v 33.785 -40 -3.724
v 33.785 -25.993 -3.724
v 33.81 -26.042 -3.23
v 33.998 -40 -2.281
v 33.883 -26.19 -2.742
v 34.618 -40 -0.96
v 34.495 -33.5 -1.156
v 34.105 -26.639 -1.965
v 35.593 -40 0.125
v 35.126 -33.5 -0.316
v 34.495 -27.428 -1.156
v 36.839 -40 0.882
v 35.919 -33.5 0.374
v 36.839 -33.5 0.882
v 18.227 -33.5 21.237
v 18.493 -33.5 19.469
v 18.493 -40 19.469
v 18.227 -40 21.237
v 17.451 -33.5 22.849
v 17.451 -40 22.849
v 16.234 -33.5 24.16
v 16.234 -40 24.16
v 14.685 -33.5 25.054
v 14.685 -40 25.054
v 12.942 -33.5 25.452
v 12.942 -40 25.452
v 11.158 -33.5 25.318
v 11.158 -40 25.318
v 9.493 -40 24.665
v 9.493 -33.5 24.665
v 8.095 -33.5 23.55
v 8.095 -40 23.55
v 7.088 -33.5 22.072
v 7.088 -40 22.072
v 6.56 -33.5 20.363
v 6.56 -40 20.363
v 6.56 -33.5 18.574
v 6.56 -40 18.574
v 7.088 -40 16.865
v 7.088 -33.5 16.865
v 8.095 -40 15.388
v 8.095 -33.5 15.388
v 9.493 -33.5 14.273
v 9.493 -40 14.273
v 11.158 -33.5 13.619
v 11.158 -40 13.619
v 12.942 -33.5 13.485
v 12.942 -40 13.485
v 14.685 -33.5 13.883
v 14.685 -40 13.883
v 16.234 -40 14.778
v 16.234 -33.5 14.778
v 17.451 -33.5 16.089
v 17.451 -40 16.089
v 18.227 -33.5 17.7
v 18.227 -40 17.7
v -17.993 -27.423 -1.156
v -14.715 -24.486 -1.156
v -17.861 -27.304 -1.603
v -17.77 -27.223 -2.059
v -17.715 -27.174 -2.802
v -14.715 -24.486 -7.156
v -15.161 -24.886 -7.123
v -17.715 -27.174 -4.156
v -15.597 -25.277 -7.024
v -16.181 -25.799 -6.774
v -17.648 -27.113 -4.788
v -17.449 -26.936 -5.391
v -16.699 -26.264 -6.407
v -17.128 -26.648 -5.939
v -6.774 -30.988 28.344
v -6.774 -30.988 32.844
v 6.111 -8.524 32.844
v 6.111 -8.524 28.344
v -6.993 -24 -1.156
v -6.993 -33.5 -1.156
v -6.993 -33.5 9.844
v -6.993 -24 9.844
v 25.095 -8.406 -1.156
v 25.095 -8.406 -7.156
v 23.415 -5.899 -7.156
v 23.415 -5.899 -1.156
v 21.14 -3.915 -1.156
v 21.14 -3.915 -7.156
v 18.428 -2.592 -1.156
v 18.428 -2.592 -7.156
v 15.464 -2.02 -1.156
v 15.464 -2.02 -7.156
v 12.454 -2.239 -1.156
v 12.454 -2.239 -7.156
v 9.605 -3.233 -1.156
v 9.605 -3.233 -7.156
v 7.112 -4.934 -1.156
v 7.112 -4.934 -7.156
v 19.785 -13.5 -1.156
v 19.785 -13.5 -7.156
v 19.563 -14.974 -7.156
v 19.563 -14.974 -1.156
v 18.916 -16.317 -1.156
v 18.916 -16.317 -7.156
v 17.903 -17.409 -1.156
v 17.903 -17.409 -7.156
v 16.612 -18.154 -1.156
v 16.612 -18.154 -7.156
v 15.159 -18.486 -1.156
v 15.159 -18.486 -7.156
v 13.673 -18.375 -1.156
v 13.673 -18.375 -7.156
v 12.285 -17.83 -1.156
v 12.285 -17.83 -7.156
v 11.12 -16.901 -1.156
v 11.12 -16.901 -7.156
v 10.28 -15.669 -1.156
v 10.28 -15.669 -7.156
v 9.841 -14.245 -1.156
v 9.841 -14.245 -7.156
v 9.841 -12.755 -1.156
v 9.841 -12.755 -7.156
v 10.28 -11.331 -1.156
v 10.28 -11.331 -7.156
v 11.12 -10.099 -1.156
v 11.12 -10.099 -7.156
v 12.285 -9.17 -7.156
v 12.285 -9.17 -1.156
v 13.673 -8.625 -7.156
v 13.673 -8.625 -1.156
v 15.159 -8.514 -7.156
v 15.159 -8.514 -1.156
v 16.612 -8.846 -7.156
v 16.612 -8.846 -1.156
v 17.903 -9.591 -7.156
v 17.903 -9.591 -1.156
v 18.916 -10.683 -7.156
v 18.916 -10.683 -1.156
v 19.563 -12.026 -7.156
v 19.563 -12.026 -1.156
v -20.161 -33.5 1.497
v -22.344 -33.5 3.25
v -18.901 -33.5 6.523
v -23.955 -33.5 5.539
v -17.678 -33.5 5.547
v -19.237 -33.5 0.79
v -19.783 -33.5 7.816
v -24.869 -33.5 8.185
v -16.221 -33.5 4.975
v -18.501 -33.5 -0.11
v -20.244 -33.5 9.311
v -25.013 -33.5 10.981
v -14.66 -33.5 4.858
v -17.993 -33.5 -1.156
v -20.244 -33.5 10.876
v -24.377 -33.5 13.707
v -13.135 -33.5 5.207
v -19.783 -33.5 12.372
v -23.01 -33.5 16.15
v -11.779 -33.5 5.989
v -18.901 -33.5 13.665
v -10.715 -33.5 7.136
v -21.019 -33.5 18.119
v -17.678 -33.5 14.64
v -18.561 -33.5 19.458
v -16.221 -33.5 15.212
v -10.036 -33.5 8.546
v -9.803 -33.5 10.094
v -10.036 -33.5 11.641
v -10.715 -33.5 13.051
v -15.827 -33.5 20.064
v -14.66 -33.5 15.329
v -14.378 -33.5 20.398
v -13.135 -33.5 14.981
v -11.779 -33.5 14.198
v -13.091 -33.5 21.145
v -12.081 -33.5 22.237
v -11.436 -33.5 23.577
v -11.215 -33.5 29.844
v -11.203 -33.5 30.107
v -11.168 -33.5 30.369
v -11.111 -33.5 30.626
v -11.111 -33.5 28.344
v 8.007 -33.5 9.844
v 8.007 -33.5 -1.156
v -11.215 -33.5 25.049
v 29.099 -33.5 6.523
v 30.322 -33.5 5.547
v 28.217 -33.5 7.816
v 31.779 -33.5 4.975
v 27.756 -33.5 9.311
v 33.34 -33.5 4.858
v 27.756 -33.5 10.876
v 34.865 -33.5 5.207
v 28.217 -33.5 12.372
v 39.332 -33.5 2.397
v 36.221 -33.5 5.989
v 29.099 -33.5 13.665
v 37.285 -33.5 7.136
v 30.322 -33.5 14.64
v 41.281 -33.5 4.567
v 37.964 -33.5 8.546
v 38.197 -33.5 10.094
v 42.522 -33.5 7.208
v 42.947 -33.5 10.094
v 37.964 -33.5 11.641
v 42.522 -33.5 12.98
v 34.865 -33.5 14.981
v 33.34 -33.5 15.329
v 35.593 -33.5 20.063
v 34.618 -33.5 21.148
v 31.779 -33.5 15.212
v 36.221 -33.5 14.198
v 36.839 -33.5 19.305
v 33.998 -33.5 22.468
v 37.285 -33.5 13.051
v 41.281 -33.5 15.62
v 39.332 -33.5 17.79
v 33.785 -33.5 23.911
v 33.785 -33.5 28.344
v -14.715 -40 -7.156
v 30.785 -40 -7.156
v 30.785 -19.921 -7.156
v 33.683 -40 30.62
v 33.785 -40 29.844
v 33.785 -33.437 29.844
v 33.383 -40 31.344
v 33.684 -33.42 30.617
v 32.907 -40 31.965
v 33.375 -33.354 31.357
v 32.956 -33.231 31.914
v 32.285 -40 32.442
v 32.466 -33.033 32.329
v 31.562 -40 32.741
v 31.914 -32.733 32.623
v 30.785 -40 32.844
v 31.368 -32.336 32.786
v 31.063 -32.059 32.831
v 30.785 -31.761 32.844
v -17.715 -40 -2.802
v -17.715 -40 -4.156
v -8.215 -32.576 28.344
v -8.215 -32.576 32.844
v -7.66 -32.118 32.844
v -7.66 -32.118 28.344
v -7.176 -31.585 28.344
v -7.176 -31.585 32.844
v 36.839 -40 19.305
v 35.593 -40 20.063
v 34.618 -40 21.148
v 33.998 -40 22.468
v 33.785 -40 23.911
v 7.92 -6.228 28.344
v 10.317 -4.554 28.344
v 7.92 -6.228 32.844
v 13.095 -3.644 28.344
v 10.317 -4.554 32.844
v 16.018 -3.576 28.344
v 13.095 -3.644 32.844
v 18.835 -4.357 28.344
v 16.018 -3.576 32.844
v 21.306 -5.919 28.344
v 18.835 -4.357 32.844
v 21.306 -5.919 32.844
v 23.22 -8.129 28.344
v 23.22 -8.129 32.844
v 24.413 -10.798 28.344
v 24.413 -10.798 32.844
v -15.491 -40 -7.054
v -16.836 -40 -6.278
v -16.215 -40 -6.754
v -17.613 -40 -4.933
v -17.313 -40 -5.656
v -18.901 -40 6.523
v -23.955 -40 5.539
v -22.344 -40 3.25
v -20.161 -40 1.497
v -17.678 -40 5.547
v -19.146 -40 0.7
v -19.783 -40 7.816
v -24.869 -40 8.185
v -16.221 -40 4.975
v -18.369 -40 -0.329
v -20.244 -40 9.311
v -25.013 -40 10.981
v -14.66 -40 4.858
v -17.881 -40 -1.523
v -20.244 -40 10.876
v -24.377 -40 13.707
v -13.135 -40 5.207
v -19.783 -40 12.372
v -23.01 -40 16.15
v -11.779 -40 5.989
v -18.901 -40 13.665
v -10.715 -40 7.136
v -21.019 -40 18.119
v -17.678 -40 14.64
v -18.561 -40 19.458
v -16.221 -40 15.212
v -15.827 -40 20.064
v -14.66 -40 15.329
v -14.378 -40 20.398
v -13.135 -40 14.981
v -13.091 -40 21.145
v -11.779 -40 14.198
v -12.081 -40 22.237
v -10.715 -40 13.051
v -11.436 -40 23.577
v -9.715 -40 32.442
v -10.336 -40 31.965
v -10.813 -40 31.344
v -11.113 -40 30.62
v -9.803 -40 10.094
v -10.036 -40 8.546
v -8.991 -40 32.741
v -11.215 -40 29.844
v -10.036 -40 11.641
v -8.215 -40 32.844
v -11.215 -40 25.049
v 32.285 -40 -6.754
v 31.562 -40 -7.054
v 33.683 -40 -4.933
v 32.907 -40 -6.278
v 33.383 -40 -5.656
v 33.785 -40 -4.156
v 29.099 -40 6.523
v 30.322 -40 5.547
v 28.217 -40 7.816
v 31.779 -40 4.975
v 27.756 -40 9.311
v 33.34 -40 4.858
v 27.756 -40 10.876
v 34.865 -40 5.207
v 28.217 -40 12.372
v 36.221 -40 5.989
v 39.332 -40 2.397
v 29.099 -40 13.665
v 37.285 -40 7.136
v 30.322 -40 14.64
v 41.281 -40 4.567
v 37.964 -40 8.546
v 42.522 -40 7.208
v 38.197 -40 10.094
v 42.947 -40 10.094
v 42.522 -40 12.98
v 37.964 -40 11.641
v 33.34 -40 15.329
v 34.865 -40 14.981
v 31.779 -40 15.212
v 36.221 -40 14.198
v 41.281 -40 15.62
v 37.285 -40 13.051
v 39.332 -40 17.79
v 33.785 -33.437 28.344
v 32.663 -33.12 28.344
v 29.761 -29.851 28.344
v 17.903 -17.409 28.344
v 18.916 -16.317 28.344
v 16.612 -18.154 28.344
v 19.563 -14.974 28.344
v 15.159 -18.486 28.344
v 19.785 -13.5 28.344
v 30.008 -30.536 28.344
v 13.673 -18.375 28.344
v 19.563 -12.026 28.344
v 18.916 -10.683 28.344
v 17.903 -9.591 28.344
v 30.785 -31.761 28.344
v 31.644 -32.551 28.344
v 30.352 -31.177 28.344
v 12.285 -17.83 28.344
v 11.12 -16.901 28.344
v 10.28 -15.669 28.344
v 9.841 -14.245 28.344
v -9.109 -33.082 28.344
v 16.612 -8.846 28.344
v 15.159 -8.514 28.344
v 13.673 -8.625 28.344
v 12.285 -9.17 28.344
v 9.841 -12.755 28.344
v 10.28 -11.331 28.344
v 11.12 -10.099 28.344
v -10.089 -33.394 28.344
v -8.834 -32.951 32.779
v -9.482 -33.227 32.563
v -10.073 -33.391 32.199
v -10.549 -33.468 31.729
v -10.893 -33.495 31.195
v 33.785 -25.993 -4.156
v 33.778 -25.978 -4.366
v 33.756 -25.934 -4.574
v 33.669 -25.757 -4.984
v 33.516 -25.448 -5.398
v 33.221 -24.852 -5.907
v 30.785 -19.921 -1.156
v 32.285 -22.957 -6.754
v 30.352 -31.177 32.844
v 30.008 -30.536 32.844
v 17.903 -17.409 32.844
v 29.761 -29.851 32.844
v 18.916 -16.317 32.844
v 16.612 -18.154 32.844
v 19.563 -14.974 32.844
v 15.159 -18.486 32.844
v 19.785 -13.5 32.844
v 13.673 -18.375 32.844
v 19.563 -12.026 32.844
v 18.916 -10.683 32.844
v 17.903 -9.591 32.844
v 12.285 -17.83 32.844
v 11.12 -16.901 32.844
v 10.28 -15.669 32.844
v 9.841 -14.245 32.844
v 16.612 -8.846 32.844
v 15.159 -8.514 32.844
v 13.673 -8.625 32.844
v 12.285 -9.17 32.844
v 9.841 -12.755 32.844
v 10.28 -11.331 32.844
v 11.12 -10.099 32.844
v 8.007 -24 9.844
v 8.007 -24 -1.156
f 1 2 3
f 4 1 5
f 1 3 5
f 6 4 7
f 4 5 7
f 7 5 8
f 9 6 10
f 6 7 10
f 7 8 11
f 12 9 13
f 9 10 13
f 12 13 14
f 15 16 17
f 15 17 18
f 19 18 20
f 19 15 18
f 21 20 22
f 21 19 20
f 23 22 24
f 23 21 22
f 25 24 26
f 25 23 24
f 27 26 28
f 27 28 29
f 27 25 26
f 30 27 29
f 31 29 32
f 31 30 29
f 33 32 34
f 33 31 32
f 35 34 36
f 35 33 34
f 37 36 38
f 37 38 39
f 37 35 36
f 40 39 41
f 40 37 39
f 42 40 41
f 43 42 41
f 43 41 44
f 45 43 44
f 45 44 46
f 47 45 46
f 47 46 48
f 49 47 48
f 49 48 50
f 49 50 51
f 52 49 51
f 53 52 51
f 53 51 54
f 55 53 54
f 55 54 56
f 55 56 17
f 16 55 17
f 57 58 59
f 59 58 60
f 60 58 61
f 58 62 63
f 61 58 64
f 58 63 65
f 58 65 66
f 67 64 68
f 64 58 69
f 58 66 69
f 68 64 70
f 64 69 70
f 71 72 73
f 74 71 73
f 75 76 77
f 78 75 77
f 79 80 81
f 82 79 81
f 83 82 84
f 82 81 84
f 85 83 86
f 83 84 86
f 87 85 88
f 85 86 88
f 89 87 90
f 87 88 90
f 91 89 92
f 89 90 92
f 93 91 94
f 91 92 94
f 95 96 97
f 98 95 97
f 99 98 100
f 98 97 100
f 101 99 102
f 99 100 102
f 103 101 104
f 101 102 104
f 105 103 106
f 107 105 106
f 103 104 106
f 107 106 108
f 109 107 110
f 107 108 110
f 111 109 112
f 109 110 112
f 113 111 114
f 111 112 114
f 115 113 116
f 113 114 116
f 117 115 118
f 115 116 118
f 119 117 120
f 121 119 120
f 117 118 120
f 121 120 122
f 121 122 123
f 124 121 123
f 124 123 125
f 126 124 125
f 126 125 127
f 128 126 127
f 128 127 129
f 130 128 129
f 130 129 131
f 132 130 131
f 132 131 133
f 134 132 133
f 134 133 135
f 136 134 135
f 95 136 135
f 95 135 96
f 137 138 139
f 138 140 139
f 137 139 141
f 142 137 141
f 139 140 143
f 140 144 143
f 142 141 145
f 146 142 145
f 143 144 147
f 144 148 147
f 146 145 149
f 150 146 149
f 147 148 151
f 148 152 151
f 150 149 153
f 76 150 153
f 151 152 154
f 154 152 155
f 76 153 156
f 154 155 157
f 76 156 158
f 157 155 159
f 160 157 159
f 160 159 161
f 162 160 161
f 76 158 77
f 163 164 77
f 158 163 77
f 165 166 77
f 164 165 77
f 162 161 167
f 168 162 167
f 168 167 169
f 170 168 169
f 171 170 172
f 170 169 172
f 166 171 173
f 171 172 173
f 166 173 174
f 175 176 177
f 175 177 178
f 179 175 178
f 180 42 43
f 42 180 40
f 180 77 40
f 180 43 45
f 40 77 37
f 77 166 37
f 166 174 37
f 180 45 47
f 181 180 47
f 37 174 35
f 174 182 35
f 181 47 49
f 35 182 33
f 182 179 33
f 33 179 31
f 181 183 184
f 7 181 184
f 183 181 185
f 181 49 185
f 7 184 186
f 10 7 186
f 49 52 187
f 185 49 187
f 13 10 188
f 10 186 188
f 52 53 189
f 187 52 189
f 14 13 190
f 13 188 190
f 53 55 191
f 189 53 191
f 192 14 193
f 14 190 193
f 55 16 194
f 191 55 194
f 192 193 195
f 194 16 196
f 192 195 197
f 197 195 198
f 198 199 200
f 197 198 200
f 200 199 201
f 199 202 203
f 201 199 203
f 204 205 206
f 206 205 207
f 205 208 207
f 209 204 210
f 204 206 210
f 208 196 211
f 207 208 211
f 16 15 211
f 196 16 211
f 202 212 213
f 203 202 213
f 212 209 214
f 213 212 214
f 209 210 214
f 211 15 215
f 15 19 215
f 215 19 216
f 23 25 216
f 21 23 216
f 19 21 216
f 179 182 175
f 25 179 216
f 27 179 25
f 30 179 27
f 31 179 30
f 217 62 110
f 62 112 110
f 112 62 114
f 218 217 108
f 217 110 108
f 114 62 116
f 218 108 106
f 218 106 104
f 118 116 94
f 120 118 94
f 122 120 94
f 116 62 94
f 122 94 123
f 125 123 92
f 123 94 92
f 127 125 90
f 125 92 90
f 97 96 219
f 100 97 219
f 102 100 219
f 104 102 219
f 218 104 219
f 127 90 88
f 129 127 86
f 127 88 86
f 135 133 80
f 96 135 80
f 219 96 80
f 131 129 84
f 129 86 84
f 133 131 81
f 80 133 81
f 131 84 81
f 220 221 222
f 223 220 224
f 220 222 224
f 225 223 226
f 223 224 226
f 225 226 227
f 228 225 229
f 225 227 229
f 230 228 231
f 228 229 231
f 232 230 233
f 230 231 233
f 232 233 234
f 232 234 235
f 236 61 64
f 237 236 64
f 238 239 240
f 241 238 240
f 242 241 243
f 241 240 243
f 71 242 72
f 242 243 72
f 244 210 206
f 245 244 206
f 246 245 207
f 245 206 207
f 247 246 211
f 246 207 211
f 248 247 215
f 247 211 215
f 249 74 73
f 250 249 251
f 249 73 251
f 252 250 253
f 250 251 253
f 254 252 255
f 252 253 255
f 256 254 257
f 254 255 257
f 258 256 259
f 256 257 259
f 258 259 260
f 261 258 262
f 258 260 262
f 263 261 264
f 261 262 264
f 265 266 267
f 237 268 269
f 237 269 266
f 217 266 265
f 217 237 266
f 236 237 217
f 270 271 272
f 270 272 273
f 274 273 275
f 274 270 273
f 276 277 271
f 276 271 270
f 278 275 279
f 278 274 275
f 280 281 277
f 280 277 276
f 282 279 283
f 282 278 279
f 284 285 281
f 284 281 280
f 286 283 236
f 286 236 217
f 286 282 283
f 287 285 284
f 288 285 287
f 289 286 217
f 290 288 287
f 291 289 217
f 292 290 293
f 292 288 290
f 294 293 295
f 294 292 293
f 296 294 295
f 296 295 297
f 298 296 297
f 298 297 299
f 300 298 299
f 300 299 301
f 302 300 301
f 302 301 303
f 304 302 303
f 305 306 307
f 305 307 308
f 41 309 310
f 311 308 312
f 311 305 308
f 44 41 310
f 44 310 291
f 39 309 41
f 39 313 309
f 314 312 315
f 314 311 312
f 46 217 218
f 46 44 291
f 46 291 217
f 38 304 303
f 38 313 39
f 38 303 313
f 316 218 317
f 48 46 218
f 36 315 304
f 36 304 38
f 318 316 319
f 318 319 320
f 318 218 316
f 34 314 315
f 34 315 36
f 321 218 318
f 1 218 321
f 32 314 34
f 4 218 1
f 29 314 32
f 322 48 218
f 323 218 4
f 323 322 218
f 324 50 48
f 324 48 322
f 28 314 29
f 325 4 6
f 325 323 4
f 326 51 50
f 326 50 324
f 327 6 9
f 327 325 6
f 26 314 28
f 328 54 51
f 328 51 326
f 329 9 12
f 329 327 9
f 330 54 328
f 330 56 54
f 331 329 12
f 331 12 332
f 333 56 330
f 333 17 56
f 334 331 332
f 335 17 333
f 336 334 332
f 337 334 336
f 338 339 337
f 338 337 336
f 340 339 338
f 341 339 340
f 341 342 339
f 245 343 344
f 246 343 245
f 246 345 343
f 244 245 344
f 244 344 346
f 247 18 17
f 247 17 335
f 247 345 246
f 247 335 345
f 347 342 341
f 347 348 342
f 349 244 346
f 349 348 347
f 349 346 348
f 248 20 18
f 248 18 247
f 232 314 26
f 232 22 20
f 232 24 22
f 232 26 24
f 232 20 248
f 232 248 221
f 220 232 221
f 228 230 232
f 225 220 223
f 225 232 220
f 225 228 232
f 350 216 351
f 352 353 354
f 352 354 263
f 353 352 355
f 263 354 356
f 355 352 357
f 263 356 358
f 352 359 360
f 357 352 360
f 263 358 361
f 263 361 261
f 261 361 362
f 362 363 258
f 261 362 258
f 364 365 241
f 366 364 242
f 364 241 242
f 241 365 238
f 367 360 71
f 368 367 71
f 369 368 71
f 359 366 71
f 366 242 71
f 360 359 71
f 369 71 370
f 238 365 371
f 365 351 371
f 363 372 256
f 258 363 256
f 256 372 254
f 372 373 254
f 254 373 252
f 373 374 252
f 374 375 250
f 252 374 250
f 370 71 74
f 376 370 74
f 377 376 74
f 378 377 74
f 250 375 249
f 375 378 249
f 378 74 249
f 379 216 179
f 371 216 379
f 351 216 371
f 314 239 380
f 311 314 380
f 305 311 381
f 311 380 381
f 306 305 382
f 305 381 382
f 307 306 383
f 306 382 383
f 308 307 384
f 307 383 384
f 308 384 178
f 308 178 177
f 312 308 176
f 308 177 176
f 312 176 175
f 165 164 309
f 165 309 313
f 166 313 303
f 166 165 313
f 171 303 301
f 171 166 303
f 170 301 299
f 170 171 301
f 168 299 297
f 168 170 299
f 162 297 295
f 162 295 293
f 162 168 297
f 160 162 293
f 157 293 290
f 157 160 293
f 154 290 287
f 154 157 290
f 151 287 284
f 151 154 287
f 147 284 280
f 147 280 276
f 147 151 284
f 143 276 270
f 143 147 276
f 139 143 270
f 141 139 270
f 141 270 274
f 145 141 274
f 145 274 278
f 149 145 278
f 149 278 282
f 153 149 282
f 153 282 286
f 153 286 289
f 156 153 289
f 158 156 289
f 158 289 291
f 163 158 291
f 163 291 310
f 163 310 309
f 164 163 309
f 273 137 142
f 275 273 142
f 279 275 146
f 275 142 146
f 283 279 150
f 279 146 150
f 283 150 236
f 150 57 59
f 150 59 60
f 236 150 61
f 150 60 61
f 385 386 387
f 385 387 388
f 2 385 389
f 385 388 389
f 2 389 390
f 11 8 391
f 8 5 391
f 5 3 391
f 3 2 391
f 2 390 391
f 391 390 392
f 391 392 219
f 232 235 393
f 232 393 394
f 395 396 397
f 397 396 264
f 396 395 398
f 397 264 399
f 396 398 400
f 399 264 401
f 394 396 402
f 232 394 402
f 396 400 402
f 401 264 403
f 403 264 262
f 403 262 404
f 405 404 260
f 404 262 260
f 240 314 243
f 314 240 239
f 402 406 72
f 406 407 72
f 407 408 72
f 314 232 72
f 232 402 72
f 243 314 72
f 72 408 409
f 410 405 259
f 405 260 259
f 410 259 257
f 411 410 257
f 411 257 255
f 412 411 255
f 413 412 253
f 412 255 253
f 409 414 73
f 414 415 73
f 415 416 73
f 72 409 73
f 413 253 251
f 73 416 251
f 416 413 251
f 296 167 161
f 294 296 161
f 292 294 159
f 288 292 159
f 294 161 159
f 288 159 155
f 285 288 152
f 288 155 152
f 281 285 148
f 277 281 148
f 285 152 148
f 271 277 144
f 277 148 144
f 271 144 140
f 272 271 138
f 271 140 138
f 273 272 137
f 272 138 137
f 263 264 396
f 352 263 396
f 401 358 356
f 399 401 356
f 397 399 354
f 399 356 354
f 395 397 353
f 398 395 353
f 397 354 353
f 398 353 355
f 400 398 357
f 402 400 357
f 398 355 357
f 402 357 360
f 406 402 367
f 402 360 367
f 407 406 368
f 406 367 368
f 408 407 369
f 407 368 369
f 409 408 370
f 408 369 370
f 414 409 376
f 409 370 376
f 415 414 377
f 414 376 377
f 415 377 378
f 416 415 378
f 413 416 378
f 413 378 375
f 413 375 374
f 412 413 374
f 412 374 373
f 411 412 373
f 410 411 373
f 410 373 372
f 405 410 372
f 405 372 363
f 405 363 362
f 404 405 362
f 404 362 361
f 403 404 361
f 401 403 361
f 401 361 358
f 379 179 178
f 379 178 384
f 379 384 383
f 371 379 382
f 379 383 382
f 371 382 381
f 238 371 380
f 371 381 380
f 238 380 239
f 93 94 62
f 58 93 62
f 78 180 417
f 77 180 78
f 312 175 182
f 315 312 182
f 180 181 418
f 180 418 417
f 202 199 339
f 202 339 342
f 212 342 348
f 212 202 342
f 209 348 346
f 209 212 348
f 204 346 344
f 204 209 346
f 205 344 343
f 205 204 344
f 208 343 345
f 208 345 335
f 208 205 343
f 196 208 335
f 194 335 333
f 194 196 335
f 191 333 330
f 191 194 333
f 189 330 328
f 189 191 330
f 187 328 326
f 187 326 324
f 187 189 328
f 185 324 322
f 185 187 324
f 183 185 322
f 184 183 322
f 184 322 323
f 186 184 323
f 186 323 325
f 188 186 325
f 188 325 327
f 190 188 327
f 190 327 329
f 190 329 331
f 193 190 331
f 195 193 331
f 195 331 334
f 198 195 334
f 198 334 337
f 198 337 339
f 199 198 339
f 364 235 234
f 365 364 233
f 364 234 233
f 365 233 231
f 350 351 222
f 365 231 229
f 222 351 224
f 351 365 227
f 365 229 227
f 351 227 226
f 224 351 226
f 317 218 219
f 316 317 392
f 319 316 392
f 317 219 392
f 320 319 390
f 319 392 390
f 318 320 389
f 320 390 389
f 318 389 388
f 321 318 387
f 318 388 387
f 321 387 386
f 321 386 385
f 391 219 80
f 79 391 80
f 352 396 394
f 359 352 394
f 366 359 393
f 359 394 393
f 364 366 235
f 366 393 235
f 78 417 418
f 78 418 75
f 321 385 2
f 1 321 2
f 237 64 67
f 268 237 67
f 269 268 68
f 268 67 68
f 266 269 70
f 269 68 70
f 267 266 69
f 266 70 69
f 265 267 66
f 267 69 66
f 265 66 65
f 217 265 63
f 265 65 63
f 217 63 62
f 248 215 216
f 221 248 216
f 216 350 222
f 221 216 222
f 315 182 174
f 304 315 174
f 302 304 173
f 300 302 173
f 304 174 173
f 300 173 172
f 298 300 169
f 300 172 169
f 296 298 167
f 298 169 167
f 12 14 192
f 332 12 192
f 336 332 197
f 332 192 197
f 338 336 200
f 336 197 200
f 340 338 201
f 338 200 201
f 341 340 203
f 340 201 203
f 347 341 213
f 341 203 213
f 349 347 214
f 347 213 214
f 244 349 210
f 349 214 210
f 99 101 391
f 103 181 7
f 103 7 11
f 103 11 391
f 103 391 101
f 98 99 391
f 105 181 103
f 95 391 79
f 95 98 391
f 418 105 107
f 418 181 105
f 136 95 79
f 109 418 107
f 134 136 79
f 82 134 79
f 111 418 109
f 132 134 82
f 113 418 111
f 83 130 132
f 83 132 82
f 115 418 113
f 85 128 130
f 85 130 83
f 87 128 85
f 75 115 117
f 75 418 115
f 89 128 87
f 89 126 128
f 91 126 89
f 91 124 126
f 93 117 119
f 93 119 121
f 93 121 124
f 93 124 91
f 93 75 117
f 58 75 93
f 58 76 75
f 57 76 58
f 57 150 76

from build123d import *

# Parameters (mm, degrees)
F0_R      = 5.25
F0_R_2    = 6
F1_DEPTH  = 40
F2_W      = 50
F2_H      = 29.5
F3_DEPTH  = 100
F4_DEPTH  = 100
F5_R      = 5
F6_DEPTH  = 50
F8_DEPTH  = 15
F10_DEPTH = 15
F11_W     = 15
F11_H     = 11
F12_DEPTH = 9.5


with BuildPart() as f1:
    # F0 (on Front) → F1 (new body)
    with BuildSketch(Plane.XZ):
        with BuildLine():
            Line((30.785211, 32.843663), (-8.214789, 32.843663))
            ThreePointArc((-8.214789, 32.843663), (-10.336109, 31.964984), (-11.214789, 29.843663))
            Line((-11.214789, 29.843663), (-11.214789, 25.048589))
            ThreePointArc((-11.214789, 25.048589), (-12.544869, 21.652755), (-15.827465, 20.063614))
            ThreePointArc((-15.827465, 20.063614), (-24.791107, 12.366478), (-20.160798, 1.496657))
            ThreePointArc((-20.160798, 1.496657), (-18.369104, -0.328989), (-17.714789, -2.801847))
            Line((-17.714789, -2.801847), (-17.714789, -4.156337))
            ThreePointArc((-17.714789, -4.156337), (-16.836109, -6.277657), (-14.714789, -7.156337))
            Line((-14.714789, -7.156337), (30.785211, -7.156337))
            ThreePointArc((30.785211, -7.156337), (32.906531, -6.277657), (33.785211, -4.156337))
            Line((33.785211, -4.156337), (33.785211, -3.723625))
            ThreePointArc((33.785211, -3.723625), (34.618075, -0.960478), (36.839202, 0.882138))
            ThreePointArc((36.839202, 0.882138), (42.947184, 10.093663), (36.839202, 19.305188))
            ThreePointArc((36.839202, 19.305188), (34.618075, 21.147805), (33.785211, 23.910951))
            Line((33.785211, 23.910951), (33.785211, 29.843663))
            ThreePointArc((33.785211, 29.843663), (32.906531, 31.964984), (30.785211, 32.843663))
        make_face()
        with Locations((-15.052816, 10.093663)):
            Circle(F0_R, mode=Mode.SUBTRACT)
        with Locations((32.947184, 10.093663)):
            Circle(F0_R, mode=Mode.SUBTRACT)
        with Locations((12.493362, 19.468693)):
            Circle(F0_R_2, mode=Mode.SUBTRACT)
    extrude(amount=F1_DEPTH)

    # F2 (on Right) → F3 (cut)
    with BuildSketch(Plane.YZ):
        with Locations((-8.5, 13.593663)):
            Rectangle(F2_W, F2_H)
    extrude(amount=-F3_DEPTH, mode=Mode.SUBTRACT)

    # F2 (on Right) → F4 (cut)
    with BuildSketch(Plane.YZ):
        with Locations((-8.5, 13.593663)):
            Rectangle(F2_W, F2_H)
    extrude(amount=F4_DEPTH, mode=Mode.SUBTRACT)

    # F5 (on face) → F6 (cut)
    with BuildSketch(Plane(origin=(0, 0, -7.156337), x_dir=(1, 0, 0), z_dir=(0, 0, -1))):
        with Locations((14.785211, 13.5)):
            Circle(F5_R)
    extrude(amount=-F6_DEPTH, mode=Mode.SUBTRACT)

    # F7 (on face) → F8 (cut)
    with BuildSketch(Plane(origin=(0, 0, -7.156337), x_dir=(1, 0, 0), z_dir=(0, 0, -1))):
        with BuildLine():
            ThreePointArc((25.095301, 8.405686), (16.964946, 2.208465), (7.112094, 4.93418))
            Line((7.112094, 4.93418), (-14.714789, 24.486333))
            Line((-14.714789, 24.486333), (-14.714789, 0))
            Line((-14.714789, 0), (30.785211, 0))
            Line((30.785211, 0), (30.785211, 19.921168))
            Line((30.785211, 19.921168), (25.095301, 8.405686))
        make_face()
        Polygon((-14.714789, 0), (-14.714789, 24.486333), (-18.07907, 27.5), (-24.334732, 27.5), (-24.334732, -4.176865), (44.914905, -4.176865), (44.914905, 27.5), (34.529984, 27.5), (30.785211, 19.921168), (30.785211, 0), align=None)
    extrude(amount=-F8_DEPTH, mode=Mode.SUBTRACT)

    # F9 (on face) → F10 (cut)
    with BuildSketch(Plane.XY.offset(32.843663)):
        with BuildLine():
            ThreePointArc((6.11086, -8.524496), (16.017743, -3.576248), (24.413154, -10.797646))
            Line((24.413154, -10.797646), (29.761066, -29.851177))
            ThreePointArc((29.761066, -29.851177), (30.168378, -30.86249), (30.785211, -31.761475))
            Line((30.785211, -31.761475), (30.785211, 0))
            Line((30.785211, 0), (-8.214789, 0))
            Line((-8.214789, 0), (-8.214789, -32.575799))
            ThreePointArc((-8.214789, -32.575799), (-7.408155, -31.859936), (-6.773794, -30.987752))
            Line((-6.773794, -30.987752), (6.11086, -8.524496))
        make_face()
        with BuildLine():
            Line((30.785211, 0), (30.785211, -31.761475))
            ThreePointArc((30.785211, -31.761475), (32.490256, -33.044633), (34.575037, -33.5))
            Line((34.575037, -33.5), (55.997241, -33.5))
            Line((55.997241, -33.5), (49.117599, 6.79242))
            Line((49.117599, 6.79242), (-12.63734, 6.79242))
            Line((-12.63734, 6.79242), (-31.90035, -33.5))
            Line((-31.90035, -33.5), (-11.110969, -33.5))
            ThreePointArc((-11.110969, -33.5), (-9.590936, -33.26335), (-8.214789, -32.575799))
            Line((-8.214789, -32.575799), (-8.214789, 0))
            Line((-8.214789, 0), (30.785211, 0))
        make_face()
    extrude(amount=-F10_DEPTH, mode=Mode.SUBTRACT)

    # F11 (on face) → F12 (join)
    with BuildSketch(Plane(origin=(0, -33.5, 0), x_dir=(-1, 0, 0), z_dir=(0, 1, 0))):
        with Locations((-0.506683, 4.343663)):
            Rectangle(F11_W, F11_H)
    extrude(amount=F12_DEPTH)


solid = f1.part
